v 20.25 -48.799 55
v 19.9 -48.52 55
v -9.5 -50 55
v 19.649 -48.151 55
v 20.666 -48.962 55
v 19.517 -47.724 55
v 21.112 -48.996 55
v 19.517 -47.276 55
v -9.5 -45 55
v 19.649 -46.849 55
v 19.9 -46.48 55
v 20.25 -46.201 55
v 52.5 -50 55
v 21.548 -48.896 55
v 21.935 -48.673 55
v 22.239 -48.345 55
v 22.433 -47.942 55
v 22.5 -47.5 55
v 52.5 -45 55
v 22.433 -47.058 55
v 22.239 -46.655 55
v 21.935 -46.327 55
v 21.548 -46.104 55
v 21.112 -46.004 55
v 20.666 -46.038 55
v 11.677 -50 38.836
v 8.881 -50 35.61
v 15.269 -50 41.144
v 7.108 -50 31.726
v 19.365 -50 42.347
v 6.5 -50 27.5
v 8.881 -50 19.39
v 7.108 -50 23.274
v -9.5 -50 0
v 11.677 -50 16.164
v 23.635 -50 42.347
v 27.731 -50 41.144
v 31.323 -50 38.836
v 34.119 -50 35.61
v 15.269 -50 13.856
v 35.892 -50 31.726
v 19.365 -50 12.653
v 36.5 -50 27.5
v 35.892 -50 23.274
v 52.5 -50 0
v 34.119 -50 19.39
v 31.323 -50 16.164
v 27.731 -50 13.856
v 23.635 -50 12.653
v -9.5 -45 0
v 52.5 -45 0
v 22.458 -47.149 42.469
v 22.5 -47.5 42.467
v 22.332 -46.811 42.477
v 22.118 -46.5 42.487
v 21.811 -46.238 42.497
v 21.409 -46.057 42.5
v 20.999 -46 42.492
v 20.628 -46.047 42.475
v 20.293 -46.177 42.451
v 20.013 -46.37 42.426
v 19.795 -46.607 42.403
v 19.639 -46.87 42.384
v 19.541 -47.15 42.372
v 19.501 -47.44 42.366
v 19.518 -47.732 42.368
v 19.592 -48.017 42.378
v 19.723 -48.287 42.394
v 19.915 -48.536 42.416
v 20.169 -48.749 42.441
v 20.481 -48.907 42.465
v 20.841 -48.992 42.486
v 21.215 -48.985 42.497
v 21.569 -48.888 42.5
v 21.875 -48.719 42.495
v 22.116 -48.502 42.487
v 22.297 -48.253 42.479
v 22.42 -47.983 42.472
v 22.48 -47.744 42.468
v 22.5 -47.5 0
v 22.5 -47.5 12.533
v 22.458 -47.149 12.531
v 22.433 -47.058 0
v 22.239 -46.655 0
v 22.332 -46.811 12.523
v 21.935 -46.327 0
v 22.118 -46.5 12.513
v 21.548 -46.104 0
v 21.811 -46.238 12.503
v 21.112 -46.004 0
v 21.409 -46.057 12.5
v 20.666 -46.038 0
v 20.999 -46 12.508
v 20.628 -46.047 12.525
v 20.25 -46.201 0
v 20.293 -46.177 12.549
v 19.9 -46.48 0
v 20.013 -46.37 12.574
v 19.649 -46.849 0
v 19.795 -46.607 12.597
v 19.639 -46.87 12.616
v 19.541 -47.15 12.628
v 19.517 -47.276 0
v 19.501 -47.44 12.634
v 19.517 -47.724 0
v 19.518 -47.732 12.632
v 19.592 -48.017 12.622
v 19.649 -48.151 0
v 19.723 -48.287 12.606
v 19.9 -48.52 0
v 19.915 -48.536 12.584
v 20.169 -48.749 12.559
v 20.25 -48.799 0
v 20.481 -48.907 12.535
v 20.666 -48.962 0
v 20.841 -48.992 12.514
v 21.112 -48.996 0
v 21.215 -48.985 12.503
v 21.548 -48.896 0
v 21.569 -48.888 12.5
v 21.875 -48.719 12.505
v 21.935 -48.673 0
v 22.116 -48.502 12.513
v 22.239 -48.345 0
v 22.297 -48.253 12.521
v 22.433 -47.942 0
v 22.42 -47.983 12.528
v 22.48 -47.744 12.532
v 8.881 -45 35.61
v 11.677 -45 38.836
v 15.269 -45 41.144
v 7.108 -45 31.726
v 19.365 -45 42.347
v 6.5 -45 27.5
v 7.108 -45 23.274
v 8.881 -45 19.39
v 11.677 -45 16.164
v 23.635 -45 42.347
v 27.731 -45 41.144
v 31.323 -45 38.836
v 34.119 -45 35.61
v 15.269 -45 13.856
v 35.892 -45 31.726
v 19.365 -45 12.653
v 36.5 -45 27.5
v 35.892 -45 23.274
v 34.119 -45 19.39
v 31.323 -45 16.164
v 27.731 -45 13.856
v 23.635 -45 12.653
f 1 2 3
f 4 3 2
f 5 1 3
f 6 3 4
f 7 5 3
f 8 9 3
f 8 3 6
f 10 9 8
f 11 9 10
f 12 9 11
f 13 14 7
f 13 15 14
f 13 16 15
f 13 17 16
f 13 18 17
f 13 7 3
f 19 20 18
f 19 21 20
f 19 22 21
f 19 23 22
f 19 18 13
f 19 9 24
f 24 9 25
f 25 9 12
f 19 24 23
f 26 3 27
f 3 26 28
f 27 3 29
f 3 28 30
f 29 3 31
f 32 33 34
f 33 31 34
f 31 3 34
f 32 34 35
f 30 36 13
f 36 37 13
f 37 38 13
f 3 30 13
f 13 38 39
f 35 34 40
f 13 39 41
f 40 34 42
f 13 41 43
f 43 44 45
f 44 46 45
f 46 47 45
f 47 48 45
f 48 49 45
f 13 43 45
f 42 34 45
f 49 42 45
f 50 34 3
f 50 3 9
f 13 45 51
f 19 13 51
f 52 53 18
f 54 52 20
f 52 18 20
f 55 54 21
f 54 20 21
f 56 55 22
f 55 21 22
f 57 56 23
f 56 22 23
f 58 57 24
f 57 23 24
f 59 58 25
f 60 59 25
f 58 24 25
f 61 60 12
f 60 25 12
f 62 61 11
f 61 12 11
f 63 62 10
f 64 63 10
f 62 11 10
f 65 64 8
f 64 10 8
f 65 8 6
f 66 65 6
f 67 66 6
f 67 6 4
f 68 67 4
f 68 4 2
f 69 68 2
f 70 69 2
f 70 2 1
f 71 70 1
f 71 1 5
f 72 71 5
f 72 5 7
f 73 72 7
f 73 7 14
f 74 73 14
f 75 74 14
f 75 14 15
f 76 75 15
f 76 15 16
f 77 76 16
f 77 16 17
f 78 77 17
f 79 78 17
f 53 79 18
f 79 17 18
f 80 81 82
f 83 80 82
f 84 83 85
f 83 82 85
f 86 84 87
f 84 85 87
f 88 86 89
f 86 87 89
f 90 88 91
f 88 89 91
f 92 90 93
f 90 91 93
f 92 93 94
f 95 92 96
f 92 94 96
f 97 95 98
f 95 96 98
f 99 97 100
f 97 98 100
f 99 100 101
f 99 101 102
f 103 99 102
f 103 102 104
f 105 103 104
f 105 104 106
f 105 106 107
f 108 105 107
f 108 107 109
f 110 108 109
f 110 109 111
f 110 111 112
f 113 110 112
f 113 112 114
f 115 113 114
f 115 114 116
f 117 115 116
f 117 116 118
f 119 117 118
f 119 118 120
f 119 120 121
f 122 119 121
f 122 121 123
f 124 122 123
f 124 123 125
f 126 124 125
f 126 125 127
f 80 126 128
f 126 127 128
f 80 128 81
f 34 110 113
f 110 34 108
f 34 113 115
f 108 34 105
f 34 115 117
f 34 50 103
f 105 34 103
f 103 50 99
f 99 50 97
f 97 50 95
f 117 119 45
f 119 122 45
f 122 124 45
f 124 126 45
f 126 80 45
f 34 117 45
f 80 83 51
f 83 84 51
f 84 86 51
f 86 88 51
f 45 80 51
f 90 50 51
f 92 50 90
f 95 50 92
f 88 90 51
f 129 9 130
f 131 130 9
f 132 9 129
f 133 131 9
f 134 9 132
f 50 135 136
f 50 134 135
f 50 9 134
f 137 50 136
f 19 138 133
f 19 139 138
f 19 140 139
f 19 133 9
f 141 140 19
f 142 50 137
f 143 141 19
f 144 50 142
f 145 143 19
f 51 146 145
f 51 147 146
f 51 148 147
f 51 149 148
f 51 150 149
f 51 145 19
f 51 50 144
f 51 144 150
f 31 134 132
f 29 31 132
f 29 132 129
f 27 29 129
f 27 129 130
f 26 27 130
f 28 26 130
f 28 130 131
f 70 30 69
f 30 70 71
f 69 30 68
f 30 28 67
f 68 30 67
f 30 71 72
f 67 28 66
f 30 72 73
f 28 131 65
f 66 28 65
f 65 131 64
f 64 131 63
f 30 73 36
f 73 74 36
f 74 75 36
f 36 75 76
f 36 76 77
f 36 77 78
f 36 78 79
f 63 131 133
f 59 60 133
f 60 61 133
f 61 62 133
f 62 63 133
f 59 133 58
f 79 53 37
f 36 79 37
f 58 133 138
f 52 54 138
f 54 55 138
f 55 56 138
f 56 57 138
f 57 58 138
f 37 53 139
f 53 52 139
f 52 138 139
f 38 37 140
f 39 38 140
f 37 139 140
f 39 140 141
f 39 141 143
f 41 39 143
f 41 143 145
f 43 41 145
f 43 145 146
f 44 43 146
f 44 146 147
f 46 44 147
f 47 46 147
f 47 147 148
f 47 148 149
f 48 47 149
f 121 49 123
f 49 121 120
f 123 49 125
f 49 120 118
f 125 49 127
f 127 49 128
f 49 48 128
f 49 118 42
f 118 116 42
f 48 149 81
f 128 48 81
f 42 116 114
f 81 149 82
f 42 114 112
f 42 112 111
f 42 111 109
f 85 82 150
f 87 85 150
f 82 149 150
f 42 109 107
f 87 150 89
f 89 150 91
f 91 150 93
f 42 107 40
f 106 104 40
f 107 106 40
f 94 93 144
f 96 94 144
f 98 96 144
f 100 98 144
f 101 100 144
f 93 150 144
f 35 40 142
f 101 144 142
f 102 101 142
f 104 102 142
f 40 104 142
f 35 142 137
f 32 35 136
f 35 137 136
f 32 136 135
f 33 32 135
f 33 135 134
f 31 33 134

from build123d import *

# Parameters (mm, degrees)
ESQUISSE1_W             = 62
ESQUISSE1_H             = 5
BOSS_EXTRU_1_DEPTH      = 55
ESQUISSE2_R             = 15
ENL_V_MAT_EXTRU_1_DEPTH = 6
ESQUISSE5_R             = 1.5
ENL_V_MAT_EXTRU_4_DEPTH = 56


with BuildPart() as part:
    # Esquisse1 → Boss.-Extru.1 (new body)
    with BuildSketch(Plane.XY):
        with Locations((21.5, -47.5)):
            Rectangle(ESQUISSE1_W, ESQUISSE1_H)
    extrude(amount=BOSS_EXTRU_1_DEPTH)

    # Esquisse2 → Enlèv. mat.-Extru.1 (cut, through all)
    with BuildSketch(Plane(origin=(0, -45, 0), x_dir=(-1, 0, 0), z_dir=(0, 1, 0))):
        with Locations((-21.5, 27.5)):
            Circle(ESQUISSE2_R)
    extrude(amount=-ENL_V_MAT_EXTRU_1_DEPTH, mode=Mode.SUBTRACT)

    # Esquisse5 → Enlèv. mat.-Extru.4 (cut, through all)
    with BuildSketch(Plane.XY.offset(55)):
        with Locations((21, -47.5)):
            Circle(ESQUISSE5_R)
    extrude(amount=-ENL_V_MAT_EXTRU_4_DEPTH, mode=Mode.SUBTRACT)


solid = part.part
